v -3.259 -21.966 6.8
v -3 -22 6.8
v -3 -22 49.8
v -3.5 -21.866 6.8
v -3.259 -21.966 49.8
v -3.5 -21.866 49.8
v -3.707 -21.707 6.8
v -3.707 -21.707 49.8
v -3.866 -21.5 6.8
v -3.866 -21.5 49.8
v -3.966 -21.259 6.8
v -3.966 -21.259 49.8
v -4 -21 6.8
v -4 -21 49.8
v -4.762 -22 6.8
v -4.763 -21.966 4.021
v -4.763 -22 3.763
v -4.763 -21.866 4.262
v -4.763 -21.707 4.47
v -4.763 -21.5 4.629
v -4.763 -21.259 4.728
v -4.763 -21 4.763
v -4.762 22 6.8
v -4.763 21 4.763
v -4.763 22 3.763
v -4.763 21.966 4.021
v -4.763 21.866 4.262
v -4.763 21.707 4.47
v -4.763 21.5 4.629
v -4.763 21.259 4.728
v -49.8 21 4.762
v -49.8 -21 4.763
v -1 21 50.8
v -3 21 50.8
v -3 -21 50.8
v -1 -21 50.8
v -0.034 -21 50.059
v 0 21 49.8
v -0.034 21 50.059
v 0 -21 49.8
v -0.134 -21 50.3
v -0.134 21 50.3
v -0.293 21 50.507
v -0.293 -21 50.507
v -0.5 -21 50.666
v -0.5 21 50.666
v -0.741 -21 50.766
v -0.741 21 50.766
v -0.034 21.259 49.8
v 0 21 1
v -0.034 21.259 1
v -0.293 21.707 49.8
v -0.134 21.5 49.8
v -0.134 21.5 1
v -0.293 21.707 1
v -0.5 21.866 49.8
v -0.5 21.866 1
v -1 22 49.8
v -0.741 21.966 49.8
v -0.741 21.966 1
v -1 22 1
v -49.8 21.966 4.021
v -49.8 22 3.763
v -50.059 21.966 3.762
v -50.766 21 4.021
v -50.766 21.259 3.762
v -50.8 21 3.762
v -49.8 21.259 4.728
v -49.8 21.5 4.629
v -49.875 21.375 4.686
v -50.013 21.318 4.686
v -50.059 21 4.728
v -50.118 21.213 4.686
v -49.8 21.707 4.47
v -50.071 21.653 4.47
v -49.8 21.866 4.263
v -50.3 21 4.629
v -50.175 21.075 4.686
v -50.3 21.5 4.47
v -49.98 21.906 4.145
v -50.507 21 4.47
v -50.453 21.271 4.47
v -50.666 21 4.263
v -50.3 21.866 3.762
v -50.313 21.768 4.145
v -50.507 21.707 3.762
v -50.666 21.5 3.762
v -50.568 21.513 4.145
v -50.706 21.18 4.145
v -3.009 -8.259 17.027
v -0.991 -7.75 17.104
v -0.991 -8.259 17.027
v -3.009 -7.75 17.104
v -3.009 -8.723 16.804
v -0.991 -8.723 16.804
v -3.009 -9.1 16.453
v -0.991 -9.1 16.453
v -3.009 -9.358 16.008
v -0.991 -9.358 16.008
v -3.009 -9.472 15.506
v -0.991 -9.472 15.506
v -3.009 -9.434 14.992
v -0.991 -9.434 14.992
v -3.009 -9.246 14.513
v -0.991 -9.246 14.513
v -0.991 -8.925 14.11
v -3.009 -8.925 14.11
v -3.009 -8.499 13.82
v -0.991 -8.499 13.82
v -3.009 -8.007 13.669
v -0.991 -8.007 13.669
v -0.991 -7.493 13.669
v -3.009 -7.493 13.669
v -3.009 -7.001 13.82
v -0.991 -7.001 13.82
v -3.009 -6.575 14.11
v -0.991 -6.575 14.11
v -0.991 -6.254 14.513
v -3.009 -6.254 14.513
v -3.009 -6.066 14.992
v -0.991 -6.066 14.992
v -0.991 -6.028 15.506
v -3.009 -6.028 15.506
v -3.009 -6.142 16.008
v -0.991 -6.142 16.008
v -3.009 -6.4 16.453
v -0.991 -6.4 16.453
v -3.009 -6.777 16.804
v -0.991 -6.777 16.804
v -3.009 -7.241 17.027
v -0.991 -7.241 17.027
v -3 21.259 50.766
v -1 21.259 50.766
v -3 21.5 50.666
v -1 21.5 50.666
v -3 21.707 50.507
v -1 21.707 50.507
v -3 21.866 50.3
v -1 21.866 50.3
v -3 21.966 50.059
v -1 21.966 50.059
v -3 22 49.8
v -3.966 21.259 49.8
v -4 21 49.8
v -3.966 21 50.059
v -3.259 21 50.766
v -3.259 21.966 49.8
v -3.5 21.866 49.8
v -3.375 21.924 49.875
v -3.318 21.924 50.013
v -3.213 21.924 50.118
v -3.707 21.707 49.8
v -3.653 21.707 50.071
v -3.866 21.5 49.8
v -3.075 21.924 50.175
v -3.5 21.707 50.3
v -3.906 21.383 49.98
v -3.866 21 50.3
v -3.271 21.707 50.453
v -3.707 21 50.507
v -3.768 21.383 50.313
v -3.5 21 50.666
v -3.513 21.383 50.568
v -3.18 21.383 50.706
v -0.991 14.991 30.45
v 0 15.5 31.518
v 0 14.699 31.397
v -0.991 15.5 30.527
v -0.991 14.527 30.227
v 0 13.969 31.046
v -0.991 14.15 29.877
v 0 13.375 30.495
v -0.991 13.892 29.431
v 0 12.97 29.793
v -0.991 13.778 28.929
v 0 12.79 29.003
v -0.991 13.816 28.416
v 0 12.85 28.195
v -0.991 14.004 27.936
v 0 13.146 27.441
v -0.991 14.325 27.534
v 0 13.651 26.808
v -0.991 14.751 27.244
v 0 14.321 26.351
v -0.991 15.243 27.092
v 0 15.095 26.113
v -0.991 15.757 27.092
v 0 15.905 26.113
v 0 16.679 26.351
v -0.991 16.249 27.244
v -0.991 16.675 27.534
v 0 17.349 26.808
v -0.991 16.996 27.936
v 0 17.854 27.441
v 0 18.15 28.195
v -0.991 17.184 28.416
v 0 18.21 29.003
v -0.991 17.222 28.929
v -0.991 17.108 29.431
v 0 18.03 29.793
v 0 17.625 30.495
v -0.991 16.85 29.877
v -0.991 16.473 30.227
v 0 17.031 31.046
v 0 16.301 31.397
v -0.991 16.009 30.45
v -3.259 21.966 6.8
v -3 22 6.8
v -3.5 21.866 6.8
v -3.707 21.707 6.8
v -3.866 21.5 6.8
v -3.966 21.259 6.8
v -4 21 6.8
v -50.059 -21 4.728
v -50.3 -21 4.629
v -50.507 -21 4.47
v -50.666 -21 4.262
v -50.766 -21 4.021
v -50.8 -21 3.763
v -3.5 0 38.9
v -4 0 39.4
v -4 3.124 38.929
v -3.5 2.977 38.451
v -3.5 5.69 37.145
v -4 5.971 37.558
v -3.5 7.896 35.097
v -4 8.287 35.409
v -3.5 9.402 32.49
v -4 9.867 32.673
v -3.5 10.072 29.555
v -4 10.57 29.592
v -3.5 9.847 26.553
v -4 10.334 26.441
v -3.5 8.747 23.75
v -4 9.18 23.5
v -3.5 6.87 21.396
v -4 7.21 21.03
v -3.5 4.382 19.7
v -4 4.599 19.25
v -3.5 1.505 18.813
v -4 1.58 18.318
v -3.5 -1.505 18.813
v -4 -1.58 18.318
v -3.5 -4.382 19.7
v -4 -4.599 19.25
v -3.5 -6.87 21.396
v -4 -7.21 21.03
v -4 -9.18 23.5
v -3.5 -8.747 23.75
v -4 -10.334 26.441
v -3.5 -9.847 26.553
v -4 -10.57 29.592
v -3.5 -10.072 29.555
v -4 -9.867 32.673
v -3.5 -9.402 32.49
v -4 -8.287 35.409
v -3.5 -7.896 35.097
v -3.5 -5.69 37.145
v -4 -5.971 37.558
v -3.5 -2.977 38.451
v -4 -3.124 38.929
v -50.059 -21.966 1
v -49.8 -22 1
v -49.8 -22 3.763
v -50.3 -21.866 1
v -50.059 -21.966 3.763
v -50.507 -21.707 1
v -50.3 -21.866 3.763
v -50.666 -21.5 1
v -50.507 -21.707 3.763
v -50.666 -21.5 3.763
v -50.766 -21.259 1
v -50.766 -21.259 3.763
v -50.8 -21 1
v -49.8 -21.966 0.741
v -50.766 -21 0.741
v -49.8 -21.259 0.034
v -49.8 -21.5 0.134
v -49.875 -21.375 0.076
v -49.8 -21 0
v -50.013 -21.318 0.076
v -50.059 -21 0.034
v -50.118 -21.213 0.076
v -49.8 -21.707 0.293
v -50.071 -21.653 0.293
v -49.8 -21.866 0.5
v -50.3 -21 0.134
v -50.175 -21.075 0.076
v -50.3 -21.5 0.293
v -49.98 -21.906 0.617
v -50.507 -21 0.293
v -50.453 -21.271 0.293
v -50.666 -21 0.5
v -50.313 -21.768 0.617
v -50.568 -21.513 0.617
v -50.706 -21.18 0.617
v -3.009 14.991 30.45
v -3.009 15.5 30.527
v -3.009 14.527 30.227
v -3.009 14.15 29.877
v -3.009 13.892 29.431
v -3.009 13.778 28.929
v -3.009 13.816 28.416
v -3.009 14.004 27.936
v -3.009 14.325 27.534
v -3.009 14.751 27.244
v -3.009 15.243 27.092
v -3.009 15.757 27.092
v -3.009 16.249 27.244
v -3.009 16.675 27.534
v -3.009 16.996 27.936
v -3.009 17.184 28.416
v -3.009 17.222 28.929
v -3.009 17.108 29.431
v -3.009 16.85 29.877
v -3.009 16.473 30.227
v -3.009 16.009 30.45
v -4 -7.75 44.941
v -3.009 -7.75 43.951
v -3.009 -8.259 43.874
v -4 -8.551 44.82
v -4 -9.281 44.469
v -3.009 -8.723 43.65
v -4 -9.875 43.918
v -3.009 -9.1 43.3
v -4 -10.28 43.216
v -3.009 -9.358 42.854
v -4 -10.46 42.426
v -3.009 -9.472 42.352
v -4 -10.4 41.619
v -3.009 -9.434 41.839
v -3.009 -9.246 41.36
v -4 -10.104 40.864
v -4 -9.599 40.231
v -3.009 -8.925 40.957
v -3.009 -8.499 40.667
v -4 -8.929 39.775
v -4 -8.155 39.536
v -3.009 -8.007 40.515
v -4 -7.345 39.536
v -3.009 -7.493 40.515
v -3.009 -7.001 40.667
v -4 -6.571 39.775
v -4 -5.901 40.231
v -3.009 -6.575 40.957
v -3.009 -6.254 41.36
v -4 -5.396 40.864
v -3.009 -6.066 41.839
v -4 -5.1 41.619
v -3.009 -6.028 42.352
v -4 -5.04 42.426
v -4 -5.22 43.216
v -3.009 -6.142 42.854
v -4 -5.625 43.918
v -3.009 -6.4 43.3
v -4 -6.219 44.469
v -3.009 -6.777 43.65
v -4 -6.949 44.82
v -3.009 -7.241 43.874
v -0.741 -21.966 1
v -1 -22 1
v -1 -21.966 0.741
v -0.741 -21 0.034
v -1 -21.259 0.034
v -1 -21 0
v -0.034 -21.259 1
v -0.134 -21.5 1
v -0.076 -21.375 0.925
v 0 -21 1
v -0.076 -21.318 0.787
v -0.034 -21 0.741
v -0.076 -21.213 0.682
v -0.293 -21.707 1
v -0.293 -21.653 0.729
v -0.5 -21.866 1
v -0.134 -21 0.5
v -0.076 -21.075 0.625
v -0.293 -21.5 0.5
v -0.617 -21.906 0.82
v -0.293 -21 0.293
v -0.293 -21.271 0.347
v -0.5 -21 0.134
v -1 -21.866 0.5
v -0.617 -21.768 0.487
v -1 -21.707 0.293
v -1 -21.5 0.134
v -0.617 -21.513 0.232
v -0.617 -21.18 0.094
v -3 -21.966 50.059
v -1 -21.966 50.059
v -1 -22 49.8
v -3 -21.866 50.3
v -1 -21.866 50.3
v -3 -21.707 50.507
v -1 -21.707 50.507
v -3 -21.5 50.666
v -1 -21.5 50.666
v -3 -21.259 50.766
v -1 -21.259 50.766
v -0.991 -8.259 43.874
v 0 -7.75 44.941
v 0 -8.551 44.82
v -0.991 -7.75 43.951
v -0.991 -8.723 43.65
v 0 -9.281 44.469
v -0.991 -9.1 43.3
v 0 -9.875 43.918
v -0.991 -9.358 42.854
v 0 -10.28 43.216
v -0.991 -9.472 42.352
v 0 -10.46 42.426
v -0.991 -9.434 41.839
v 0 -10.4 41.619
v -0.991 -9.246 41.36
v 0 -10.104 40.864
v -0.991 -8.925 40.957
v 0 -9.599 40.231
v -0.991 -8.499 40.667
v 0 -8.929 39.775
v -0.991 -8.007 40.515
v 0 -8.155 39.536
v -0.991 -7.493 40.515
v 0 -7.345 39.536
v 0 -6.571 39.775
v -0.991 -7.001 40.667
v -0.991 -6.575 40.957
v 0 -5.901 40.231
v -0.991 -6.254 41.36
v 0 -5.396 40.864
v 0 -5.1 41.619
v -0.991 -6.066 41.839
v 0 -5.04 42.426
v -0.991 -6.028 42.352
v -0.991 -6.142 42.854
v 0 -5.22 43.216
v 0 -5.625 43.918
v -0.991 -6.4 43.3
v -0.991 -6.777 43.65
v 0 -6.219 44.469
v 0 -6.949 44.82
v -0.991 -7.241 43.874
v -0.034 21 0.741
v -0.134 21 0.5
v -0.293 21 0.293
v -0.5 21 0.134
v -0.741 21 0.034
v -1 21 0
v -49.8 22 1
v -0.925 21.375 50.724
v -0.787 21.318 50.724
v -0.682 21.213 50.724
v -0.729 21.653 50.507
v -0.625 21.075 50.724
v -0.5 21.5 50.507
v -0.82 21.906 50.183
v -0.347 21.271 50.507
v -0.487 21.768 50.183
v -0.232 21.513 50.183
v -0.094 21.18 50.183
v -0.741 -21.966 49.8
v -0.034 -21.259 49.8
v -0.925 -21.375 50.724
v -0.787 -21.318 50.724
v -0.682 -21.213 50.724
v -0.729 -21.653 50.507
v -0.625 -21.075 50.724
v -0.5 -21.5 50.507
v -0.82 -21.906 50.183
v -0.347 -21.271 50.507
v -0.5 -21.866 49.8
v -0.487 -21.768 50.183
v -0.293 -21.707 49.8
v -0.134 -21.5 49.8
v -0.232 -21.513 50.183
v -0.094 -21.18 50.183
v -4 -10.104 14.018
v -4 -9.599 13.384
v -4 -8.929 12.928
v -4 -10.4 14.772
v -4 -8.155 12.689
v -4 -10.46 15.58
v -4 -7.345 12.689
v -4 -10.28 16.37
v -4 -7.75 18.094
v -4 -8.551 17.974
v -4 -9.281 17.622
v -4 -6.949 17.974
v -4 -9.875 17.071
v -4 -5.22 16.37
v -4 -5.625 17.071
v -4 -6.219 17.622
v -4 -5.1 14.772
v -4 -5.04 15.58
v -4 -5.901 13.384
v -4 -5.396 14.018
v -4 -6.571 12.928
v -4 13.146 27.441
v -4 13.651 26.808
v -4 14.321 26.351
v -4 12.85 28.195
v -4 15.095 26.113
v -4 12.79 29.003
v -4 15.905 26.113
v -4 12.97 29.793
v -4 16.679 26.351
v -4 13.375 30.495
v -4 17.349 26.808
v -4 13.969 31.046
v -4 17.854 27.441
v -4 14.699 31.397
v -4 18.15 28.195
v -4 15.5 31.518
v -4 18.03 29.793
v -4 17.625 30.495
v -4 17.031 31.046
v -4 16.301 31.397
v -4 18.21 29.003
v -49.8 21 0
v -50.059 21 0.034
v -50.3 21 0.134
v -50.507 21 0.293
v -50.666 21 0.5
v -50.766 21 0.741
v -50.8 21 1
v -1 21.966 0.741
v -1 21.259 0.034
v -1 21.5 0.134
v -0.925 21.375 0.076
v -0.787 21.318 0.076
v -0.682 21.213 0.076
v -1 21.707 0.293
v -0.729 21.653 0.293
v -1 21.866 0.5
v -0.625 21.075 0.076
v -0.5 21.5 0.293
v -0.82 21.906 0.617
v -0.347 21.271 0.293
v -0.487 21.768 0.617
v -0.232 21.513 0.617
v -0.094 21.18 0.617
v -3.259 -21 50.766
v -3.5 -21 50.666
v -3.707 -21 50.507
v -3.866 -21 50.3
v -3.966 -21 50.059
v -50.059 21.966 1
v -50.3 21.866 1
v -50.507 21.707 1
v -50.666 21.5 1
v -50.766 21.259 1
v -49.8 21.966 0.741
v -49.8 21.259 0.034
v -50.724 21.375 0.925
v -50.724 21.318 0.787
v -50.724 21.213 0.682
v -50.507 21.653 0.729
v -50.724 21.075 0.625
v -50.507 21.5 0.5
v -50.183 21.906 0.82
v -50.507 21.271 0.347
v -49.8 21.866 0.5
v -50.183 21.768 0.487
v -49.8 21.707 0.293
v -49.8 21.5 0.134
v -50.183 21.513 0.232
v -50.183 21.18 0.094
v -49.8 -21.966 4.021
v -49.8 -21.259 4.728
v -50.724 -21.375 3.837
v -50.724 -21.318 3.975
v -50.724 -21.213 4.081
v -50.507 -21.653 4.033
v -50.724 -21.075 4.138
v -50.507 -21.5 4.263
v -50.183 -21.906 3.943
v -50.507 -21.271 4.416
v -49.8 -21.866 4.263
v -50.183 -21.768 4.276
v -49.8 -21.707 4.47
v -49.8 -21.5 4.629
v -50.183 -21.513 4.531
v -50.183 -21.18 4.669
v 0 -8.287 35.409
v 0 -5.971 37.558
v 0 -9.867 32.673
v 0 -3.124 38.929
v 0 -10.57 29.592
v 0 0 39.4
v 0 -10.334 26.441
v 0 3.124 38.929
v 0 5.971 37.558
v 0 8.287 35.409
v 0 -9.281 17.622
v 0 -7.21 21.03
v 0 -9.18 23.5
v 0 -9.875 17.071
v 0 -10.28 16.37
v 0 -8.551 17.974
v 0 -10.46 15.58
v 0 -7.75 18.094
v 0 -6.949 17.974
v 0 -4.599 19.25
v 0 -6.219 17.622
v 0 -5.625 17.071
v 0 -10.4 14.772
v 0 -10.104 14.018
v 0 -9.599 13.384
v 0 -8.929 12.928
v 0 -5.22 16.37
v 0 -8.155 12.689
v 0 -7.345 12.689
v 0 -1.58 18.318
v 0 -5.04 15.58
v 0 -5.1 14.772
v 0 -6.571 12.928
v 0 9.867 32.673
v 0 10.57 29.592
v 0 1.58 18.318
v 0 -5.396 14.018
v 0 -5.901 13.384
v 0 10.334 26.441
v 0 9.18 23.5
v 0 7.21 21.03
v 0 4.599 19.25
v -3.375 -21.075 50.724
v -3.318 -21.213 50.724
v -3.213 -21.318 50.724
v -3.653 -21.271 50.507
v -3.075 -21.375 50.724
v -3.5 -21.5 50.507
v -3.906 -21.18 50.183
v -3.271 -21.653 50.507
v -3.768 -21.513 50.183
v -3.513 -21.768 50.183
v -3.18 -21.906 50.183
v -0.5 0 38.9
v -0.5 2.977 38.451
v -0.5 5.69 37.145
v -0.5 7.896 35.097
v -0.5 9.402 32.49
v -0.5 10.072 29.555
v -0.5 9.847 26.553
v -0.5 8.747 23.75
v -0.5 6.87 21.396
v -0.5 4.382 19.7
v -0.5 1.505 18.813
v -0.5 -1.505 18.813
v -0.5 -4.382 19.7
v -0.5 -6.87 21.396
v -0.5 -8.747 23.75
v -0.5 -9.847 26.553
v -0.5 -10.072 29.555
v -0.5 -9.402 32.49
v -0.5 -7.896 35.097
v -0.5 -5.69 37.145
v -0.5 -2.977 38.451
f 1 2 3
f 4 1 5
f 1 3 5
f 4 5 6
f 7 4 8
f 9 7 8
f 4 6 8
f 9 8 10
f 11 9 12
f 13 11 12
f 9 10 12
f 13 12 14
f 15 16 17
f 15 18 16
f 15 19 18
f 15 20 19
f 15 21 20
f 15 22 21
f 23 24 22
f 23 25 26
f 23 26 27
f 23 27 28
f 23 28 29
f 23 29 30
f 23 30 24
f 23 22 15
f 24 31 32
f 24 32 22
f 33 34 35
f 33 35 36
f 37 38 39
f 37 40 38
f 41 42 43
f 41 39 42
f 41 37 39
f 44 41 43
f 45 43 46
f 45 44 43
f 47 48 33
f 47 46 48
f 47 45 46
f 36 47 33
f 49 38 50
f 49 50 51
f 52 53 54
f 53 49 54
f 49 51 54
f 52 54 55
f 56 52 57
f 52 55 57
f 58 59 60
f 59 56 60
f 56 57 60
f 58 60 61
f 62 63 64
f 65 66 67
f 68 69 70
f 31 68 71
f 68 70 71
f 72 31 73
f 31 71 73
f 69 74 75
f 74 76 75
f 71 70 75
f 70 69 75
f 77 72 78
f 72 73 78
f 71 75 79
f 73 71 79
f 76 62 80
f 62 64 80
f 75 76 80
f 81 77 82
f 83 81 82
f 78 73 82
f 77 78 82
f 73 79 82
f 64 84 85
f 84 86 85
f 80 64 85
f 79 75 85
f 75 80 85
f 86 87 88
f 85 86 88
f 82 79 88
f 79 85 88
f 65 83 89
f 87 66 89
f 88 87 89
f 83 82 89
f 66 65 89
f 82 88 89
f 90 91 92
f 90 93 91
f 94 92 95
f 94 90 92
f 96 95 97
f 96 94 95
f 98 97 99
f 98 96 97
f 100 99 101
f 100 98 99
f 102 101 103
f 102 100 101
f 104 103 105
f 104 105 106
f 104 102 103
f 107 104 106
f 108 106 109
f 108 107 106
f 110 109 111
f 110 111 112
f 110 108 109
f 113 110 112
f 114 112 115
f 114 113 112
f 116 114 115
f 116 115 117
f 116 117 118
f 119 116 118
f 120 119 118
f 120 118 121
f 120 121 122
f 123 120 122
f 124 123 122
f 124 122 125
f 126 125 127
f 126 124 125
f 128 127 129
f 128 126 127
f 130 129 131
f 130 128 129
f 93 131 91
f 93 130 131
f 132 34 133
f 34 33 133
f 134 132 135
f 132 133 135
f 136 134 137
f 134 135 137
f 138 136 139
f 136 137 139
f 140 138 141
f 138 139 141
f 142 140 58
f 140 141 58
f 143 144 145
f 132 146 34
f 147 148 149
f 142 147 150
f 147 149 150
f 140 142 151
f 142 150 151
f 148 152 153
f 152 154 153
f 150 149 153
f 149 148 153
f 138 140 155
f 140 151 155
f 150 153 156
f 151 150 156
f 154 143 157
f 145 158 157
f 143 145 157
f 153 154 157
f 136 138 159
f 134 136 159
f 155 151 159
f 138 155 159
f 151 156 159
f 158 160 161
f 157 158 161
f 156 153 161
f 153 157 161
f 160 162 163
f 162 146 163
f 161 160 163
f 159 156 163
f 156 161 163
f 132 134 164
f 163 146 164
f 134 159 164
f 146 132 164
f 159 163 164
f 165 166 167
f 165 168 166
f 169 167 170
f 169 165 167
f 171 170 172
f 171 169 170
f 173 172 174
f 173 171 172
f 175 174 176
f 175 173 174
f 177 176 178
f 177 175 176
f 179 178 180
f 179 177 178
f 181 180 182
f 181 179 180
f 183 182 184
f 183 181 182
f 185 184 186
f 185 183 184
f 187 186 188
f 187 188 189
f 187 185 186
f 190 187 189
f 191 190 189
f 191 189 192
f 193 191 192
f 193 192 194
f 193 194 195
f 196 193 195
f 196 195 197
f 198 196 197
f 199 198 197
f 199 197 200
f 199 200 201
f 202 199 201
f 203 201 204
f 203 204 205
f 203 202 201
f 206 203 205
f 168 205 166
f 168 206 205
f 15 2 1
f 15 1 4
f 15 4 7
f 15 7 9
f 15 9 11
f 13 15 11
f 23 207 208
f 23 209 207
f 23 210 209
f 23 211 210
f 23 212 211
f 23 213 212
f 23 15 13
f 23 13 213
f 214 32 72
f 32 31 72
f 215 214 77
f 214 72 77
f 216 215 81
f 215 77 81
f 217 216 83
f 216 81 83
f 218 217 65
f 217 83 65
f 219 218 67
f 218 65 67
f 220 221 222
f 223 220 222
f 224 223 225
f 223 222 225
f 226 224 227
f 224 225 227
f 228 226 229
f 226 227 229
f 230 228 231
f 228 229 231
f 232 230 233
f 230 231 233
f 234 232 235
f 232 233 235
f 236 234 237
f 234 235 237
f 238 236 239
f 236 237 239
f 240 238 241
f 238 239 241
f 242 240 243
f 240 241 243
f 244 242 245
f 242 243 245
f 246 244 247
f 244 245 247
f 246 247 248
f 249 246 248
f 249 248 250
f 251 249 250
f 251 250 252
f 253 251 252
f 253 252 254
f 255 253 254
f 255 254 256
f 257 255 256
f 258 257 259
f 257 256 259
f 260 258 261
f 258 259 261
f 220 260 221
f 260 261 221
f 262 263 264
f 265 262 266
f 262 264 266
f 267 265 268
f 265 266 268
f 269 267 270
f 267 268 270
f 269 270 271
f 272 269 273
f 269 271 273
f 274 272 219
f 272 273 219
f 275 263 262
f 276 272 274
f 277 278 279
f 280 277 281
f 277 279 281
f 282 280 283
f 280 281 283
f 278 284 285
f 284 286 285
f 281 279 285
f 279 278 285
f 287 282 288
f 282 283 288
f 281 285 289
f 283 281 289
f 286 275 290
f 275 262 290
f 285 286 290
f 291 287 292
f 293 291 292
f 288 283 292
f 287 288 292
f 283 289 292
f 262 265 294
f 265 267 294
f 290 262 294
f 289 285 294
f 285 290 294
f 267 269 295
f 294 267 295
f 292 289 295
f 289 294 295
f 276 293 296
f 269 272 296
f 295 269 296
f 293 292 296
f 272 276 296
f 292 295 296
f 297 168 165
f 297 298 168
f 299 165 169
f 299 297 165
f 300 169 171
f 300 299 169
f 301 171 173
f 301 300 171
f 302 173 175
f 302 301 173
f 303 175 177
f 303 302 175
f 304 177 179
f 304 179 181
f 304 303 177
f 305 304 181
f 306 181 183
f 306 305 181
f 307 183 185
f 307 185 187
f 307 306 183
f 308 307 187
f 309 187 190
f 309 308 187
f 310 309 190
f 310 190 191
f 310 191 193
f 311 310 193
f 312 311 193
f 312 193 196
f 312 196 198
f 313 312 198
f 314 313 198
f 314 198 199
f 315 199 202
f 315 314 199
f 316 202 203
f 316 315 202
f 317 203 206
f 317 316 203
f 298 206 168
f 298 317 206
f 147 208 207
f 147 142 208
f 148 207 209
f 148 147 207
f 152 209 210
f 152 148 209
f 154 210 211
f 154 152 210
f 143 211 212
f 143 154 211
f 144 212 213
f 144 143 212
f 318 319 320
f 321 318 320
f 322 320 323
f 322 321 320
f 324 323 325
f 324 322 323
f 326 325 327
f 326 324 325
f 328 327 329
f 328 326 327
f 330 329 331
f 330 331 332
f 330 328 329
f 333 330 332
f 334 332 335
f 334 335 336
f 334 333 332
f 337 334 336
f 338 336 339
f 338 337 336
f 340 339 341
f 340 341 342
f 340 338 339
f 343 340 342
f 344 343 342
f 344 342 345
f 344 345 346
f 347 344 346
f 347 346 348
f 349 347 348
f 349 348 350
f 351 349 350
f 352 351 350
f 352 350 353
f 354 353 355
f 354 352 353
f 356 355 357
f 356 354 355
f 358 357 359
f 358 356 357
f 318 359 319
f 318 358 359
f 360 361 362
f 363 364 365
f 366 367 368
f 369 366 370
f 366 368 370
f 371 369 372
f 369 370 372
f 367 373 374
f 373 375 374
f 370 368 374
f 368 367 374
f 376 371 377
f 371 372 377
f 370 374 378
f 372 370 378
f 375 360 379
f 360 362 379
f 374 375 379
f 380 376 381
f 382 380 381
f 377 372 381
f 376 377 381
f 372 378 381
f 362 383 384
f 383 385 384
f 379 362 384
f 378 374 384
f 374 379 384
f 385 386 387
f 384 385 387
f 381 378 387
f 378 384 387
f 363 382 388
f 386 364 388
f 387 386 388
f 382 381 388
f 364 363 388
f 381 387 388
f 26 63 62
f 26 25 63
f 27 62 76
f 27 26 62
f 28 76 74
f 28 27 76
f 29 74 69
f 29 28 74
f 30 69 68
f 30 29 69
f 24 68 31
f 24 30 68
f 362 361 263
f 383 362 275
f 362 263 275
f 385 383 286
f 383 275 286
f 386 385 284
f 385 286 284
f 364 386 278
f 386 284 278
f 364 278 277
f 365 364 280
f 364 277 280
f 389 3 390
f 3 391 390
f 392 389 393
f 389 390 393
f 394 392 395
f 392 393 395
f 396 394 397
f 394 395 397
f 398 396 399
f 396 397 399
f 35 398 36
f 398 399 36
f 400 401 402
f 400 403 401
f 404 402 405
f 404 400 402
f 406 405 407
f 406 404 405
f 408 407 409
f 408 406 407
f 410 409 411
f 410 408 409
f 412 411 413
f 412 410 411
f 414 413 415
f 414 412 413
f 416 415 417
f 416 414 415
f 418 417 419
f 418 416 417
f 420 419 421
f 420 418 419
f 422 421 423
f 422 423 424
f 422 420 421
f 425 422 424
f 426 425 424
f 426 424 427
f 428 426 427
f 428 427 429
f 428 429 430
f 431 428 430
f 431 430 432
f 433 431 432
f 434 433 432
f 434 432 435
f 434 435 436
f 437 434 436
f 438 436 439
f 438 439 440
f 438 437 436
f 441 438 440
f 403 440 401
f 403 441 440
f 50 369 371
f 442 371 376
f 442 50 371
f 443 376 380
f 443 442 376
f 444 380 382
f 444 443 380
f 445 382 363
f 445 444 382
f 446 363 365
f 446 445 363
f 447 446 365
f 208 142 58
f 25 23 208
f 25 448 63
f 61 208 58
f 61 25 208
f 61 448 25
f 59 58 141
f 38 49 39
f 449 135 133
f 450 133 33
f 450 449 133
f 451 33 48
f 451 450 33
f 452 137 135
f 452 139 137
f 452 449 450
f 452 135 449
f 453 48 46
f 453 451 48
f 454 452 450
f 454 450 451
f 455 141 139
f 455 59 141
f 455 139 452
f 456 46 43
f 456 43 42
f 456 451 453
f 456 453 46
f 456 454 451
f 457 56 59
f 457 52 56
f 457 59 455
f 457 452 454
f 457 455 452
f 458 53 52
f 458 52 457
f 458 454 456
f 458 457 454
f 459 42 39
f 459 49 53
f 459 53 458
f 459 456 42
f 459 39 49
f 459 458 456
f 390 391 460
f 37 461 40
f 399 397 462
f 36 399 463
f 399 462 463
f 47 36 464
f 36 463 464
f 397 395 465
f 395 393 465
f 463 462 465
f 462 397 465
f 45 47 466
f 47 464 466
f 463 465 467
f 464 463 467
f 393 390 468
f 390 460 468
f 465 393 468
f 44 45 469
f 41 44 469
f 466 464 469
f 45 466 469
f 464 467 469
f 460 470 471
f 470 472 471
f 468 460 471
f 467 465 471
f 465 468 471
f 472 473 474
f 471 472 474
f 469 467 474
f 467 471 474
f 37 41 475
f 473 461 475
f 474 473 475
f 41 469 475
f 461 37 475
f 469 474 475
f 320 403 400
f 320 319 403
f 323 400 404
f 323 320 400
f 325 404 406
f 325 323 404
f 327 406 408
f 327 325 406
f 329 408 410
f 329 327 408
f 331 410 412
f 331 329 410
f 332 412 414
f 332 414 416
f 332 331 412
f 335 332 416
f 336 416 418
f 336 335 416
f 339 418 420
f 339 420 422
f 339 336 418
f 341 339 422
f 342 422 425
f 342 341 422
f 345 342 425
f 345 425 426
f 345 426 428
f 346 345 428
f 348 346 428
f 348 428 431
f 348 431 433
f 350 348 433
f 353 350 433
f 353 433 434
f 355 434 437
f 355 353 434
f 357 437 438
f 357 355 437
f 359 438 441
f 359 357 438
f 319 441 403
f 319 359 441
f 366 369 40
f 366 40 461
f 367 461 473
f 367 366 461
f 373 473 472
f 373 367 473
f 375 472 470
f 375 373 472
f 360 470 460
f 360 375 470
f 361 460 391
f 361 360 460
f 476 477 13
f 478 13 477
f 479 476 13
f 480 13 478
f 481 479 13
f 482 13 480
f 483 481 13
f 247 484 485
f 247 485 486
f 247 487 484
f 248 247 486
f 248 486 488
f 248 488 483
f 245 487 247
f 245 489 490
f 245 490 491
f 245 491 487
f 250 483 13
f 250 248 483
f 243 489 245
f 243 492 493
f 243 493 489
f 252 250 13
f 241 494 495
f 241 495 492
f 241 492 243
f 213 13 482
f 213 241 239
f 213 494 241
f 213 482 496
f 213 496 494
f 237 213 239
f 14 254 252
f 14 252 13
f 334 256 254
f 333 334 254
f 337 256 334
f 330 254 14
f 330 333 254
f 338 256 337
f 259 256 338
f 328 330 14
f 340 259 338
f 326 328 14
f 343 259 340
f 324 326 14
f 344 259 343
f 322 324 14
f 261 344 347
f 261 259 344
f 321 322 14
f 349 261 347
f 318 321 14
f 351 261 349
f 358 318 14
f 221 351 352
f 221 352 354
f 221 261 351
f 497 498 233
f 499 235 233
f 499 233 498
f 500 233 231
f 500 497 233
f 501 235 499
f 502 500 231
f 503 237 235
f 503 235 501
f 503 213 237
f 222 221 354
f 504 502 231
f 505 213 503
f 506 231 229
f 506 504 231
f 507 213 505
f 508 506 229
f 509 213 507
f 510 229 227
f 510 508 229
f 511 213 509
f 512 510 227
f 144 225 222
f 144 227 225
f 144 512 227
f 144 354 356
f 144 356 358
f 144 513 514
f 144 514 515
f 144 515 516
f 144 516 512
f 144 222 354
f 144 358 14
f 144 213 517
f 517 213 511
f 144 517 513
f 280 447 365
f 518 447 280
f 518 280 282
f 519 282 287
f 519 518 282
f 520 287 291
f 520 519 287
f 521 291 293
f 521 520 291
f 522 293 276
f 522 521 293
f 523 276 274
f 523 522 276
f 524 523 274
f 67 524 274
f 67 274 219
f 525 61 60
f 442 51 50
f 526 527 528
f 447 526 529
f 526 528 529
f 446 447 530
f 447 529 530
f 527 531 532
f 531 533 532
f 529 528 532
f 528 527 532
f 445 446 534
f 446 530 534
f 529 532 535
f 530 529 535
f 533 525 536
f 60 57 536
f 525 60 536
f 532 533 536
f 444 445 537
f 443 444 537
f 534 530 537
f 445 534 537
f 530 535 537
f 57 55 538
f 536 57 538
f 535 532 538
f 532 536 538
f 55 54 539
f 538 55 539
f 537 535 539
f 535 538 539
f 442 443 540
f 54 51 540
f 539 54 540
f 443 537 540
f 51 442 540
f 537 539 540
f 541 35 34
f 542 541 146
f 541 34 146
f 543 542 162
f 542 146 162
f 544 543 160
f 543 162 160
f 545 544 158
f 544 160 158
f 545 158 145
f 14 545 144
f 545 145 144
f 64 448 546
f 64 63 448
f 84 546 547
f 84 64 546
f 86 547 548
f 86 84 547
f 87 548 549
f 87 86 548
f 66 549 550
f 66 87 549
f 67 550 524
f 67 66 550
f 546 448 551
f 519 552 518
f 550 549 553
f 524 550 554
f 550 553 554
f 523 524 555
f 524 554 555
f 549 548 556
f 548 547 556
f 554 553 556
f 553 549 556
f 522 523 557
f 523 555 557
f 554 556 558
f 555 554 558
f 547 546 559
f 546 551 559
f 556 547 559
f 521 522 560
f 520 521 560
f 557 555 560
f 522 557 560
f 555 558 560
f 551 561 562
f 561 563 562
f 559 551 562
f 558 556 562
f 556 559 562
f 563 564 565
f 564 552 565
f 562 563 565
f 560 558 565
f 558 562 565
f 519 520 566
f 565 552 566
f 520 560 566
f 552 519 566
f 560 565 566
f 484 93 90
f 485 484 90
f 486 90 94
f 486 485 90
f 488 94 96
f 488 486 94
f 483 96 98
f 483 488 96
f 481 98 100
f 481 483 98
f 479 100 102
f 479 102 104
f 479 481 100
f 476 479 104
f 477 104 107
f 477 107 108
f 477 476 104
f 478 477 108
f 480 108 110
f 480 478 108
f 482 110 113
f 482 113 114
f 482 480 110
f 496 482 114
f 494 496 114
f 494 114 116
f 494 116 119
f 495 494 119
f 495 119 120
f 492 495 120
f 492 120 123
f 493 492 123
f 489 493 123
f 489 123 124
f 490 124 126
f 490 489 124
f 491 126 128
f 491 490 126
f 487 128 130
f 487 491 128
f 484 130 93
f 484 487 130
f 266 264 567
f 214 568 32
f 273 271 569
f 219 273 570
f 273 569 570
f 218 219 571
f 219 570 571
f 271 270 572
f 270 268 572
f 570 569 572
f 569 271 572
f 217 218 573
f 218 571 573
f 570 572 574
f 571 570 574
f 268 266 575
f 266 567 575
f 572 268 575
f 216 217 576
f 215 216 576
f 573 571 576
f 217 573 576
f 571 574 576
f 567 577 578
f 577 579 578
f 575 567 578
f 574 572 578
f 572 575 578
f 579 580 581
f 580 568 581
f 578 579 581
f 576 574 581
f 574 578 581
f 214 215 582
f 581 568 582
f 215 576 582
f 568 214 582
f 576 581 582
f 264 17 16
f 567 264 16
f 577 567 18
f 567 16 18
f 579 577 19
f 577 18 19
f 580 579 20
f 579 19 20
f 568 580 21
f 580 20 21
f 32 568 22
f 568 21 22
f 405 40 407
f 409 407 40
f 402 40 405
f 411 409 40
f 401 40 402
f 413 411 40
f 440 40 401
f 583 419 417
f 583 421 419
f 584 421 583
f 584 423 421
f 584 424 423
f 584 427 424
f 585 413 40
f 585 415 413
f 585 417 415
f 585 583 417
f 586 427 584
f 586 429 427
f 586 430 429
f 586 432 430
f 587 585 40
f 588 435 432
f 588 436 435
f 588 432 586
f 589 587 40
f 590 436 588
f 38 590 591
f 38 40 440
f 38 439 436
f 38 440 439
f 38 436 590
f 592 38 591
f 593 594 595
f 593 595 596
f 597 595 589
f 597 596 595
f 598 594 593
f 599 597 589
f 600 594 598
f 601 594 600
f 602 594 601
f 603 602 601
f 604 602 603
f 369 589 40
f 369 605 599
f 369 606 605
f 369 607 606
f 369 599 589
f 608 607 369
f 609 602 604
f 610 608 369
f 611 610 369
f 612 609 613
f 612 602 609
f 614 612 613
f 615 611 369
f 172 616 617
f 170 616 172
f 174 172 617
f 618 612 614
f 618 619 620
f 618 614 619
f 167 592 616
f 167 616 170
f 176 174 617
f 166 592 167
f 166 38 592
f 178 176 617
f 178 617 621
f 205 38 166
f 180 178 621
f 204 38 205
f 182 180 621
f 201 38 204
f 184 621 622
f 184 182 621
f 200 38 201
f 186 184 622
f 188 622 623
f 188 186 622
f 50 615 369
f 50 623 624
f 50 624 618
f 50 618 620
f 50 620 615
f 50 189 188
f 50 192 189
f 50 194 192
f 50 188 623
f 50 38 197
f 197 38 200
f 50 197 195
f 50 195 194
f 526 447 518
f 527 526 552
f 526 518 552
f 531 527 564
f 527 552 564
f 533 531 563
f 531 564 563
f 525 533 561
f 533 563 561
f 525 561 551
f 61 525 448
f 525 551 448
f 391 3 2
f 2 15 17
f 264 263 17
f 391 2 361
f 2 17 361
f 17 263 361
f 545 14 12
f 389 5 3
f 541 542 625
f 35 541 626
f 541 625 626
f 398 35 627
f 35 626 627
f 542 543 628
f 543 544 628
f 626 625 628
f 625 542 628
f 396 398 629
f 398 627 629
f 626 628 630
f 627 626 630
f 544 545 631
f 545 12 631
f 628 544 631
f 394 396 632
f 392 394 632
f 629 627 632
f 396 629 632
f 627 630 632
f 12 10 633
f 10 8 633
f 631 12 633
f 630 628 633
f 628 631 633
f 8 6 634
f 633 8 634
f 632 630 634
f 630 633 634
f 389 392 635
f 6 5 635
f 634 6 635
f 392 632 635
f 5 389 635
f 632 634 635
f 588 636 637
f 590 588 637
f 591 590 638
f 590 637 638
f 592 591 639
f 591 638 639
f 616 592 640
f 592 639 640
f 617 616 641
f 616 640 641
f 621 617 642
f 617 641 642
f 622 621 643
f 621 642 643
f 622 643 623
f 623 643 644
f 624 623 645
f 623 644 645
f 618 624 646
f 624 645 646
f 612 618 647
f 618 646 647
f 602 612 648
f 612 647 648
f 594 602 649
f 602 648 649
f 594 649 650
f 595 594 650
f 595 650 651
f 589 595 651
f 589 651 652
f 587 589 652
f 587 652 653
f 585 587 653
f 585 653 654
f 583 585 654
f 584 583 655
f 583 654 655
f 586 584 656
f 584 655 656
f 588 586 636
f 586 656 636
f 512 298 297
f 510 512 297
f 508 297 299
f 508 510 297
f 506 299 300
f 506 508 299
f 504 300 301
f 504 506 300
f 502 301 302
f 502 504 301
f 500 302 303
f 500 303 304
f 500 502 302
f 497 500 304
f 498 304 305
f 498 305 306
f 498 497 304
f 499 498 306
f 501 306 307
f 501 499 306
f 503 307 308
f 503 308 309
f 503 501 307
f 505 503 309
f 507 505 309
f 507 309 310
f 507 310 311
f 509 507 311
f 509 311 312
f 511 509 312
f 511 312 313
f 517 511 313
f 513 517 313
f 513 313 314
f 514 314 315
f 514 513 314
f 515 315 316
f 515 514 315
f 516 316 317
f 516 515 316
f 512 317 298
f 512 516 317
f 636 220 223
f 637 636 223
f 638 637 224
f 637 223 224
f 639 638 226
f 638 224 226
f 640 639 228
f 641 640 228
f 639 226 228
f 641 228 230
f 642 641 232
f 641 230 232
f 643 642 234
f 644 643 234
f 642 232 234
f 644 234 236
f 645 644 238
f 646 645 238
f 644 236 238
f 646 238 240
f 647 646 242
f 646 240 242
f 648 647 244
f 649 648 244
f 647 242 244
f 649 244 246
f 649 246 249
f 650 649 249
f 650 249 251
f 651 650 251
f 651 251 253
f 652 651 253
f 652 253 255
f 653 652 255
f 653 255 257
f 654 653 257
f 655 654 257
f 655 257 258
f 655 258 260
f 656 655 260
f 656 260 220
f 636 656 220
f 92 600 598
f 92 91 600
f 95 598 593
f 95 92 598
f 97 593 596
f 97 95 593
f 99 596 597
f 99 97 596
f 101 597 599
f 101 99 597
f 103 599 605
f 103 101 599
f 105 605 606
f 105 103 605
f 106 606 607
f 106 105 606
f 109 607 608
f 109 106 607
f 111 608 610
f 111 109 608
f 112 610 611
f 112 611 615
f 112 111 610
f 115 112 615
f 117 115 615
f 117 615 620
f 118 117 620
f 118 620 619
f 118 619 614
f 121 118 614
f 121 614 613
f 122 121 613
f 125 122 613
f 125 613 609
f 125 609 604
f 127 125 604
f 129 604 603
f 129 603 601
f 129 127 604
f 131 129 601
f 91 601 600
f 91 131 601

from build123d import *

# Parameters (mm, degrees)
EXTRUDE_THIN2_DEPTH            = 22
SKETCH3_W                      = 44
SKETCH3_H                      = 44
CUT_EXTRUDE1_DEPTH             = 0.7625
SKETCH4_R                      = 10.1
CUT_EXTRUDE2_DEPTH             = 5
F_8_32_TAPPED_HOLE1_AT_2_COUNT = 2
F_8_32_TAPPED_HOLE1_AT_2_PITCH = 26.846787517
F_8_32_TAPPED_HOLE1_AT_3_COUNT = 2
F_8_32_TAPPED_HOLE1_AT_3_PITCH = 26.846787517
CHAMFER2_SIZE                  = 0.5
FILLET1_R                      = 1


with BuildPart() as part:
    # Sketch2 → Extrude-Thin2 (new body, symmetric)
    with BuildSketch(Plane(origin=(0, 0, 0), x_dir=(1, 0, 0), z_dir=(0, 1, 0))):
        Polygon((0, -50.8), (0, 0), (-50.8, 0), (-50.8, -4.7625), (-4.7625, -4.7625), (-4.7625, -50.8), align=None)
    extrude(amount=EXTRUDE_THIN2_DEPTH, both=True)

    # Sketch3 → Cut-Extrude1 (cut)
    with BuildSketch(Plane.ZY.offset(4.7625)):
        with Locations((28.8, 0)):
            Rectangle(SKETCH3_W, SKETCH3_H)
    extrude(amount=-CUT_EXTRUDE1_DEPTH, mode=Mode.SUBTRACT)

    # Sketch4 → Cut-Extrude2 (cut, through all)
    with BuildSketch(Plane.ZY.offset(4)):
        with Locations((28.8, 0)):
            Circle(SKETCH4_R)
    extrude(amount=-CUT_EXTRUDE2_DEPTH, mode=Mode.SUBTRACT)

    # Sketch6 → #8-32 Tapped Hole1 (revolve, cut)
    with BuildSketch(Plane(origin=(-4, 15.5, 28.8), x_dir=(0, 0, 1), z_dir=(0, 1, 0))):
        Polygon((0, 0), (0, 4), (2.7178, 4), (1.7272, 3.0094), (1.7272, 0.9906), (2.7178, 0), align=None)
    f_8_32_tapped_hole1 = revolve(axis=Axis((-10.35, 15.5, 28.8), (1, 0, 0)), mode=Mode.SUBTRACT)

    # #8-32 Tapped Hole1 at 2: #8-32 Tapped Hole1 ×2
    with Locations(*[Vector(0, -0.866025404, 0.5) * (i * F_8_32_TAPPED_HOLE1_AT_2_PITCH) for i in range(1, F_8_32_TAPPED_HOLE1_AT_2_COUNT)]):
        add(f_8_32_tapped_hole1, mode=Mode.SUBTRACT)

    # #8-32 Tapped Hole1 at 3: #8-32 Tapped Hole1 ×2
    with Locations(*[Vector(0, -0.866025404, -0.5) * (i * F_8_32_TAPPED_HOLE1_AT_3_PITCH) for i in range(1, F_8_32_TAPPED_HOLE1_AT_3_COUNT)]):
        add(f_8_32_tapped_hole1, mode=Mode.SUBTRACT)

    # Chamfer2
    chamfer2_edges = [part.edges().sort_by_distance(p)[0] for p in [
        (0, 0, 18.7),
        (-4, 0, 18.7),
    ]]
    chamfer(chamfer2_edges, length=CHAMFER2_SIZE)

    # Fillet1
    fillet1_edges = [part.edges().sort_by_distance(p)[0] for p in [
        (0, 22, 25.4),
        (-25.4, 22, 0),
        (-50.8, 22, 2.38125),
        (-27.78125, 22, 4.7625),
        (-4, -22, 28.8),
        (-4, 0, 50.8),
        (-4, 22, 28.8),
        (-27.78125, -22, 4.7625),
        (-50.8, -22, 2.38125),
        (-25.4, -22, 0),
        (0, -22, 25.4),
        (-2, -22, 50.8),
        (-2, 22, 50.8),
        (-50.8, 0, 4.7625),
        (-50.8, 0, 0),
        (0, 0, 0),
        (0, 0, 50.8),
    ]]
    fillet(fillet1_edges, radius=FILLET1_R)


solid = part.part
